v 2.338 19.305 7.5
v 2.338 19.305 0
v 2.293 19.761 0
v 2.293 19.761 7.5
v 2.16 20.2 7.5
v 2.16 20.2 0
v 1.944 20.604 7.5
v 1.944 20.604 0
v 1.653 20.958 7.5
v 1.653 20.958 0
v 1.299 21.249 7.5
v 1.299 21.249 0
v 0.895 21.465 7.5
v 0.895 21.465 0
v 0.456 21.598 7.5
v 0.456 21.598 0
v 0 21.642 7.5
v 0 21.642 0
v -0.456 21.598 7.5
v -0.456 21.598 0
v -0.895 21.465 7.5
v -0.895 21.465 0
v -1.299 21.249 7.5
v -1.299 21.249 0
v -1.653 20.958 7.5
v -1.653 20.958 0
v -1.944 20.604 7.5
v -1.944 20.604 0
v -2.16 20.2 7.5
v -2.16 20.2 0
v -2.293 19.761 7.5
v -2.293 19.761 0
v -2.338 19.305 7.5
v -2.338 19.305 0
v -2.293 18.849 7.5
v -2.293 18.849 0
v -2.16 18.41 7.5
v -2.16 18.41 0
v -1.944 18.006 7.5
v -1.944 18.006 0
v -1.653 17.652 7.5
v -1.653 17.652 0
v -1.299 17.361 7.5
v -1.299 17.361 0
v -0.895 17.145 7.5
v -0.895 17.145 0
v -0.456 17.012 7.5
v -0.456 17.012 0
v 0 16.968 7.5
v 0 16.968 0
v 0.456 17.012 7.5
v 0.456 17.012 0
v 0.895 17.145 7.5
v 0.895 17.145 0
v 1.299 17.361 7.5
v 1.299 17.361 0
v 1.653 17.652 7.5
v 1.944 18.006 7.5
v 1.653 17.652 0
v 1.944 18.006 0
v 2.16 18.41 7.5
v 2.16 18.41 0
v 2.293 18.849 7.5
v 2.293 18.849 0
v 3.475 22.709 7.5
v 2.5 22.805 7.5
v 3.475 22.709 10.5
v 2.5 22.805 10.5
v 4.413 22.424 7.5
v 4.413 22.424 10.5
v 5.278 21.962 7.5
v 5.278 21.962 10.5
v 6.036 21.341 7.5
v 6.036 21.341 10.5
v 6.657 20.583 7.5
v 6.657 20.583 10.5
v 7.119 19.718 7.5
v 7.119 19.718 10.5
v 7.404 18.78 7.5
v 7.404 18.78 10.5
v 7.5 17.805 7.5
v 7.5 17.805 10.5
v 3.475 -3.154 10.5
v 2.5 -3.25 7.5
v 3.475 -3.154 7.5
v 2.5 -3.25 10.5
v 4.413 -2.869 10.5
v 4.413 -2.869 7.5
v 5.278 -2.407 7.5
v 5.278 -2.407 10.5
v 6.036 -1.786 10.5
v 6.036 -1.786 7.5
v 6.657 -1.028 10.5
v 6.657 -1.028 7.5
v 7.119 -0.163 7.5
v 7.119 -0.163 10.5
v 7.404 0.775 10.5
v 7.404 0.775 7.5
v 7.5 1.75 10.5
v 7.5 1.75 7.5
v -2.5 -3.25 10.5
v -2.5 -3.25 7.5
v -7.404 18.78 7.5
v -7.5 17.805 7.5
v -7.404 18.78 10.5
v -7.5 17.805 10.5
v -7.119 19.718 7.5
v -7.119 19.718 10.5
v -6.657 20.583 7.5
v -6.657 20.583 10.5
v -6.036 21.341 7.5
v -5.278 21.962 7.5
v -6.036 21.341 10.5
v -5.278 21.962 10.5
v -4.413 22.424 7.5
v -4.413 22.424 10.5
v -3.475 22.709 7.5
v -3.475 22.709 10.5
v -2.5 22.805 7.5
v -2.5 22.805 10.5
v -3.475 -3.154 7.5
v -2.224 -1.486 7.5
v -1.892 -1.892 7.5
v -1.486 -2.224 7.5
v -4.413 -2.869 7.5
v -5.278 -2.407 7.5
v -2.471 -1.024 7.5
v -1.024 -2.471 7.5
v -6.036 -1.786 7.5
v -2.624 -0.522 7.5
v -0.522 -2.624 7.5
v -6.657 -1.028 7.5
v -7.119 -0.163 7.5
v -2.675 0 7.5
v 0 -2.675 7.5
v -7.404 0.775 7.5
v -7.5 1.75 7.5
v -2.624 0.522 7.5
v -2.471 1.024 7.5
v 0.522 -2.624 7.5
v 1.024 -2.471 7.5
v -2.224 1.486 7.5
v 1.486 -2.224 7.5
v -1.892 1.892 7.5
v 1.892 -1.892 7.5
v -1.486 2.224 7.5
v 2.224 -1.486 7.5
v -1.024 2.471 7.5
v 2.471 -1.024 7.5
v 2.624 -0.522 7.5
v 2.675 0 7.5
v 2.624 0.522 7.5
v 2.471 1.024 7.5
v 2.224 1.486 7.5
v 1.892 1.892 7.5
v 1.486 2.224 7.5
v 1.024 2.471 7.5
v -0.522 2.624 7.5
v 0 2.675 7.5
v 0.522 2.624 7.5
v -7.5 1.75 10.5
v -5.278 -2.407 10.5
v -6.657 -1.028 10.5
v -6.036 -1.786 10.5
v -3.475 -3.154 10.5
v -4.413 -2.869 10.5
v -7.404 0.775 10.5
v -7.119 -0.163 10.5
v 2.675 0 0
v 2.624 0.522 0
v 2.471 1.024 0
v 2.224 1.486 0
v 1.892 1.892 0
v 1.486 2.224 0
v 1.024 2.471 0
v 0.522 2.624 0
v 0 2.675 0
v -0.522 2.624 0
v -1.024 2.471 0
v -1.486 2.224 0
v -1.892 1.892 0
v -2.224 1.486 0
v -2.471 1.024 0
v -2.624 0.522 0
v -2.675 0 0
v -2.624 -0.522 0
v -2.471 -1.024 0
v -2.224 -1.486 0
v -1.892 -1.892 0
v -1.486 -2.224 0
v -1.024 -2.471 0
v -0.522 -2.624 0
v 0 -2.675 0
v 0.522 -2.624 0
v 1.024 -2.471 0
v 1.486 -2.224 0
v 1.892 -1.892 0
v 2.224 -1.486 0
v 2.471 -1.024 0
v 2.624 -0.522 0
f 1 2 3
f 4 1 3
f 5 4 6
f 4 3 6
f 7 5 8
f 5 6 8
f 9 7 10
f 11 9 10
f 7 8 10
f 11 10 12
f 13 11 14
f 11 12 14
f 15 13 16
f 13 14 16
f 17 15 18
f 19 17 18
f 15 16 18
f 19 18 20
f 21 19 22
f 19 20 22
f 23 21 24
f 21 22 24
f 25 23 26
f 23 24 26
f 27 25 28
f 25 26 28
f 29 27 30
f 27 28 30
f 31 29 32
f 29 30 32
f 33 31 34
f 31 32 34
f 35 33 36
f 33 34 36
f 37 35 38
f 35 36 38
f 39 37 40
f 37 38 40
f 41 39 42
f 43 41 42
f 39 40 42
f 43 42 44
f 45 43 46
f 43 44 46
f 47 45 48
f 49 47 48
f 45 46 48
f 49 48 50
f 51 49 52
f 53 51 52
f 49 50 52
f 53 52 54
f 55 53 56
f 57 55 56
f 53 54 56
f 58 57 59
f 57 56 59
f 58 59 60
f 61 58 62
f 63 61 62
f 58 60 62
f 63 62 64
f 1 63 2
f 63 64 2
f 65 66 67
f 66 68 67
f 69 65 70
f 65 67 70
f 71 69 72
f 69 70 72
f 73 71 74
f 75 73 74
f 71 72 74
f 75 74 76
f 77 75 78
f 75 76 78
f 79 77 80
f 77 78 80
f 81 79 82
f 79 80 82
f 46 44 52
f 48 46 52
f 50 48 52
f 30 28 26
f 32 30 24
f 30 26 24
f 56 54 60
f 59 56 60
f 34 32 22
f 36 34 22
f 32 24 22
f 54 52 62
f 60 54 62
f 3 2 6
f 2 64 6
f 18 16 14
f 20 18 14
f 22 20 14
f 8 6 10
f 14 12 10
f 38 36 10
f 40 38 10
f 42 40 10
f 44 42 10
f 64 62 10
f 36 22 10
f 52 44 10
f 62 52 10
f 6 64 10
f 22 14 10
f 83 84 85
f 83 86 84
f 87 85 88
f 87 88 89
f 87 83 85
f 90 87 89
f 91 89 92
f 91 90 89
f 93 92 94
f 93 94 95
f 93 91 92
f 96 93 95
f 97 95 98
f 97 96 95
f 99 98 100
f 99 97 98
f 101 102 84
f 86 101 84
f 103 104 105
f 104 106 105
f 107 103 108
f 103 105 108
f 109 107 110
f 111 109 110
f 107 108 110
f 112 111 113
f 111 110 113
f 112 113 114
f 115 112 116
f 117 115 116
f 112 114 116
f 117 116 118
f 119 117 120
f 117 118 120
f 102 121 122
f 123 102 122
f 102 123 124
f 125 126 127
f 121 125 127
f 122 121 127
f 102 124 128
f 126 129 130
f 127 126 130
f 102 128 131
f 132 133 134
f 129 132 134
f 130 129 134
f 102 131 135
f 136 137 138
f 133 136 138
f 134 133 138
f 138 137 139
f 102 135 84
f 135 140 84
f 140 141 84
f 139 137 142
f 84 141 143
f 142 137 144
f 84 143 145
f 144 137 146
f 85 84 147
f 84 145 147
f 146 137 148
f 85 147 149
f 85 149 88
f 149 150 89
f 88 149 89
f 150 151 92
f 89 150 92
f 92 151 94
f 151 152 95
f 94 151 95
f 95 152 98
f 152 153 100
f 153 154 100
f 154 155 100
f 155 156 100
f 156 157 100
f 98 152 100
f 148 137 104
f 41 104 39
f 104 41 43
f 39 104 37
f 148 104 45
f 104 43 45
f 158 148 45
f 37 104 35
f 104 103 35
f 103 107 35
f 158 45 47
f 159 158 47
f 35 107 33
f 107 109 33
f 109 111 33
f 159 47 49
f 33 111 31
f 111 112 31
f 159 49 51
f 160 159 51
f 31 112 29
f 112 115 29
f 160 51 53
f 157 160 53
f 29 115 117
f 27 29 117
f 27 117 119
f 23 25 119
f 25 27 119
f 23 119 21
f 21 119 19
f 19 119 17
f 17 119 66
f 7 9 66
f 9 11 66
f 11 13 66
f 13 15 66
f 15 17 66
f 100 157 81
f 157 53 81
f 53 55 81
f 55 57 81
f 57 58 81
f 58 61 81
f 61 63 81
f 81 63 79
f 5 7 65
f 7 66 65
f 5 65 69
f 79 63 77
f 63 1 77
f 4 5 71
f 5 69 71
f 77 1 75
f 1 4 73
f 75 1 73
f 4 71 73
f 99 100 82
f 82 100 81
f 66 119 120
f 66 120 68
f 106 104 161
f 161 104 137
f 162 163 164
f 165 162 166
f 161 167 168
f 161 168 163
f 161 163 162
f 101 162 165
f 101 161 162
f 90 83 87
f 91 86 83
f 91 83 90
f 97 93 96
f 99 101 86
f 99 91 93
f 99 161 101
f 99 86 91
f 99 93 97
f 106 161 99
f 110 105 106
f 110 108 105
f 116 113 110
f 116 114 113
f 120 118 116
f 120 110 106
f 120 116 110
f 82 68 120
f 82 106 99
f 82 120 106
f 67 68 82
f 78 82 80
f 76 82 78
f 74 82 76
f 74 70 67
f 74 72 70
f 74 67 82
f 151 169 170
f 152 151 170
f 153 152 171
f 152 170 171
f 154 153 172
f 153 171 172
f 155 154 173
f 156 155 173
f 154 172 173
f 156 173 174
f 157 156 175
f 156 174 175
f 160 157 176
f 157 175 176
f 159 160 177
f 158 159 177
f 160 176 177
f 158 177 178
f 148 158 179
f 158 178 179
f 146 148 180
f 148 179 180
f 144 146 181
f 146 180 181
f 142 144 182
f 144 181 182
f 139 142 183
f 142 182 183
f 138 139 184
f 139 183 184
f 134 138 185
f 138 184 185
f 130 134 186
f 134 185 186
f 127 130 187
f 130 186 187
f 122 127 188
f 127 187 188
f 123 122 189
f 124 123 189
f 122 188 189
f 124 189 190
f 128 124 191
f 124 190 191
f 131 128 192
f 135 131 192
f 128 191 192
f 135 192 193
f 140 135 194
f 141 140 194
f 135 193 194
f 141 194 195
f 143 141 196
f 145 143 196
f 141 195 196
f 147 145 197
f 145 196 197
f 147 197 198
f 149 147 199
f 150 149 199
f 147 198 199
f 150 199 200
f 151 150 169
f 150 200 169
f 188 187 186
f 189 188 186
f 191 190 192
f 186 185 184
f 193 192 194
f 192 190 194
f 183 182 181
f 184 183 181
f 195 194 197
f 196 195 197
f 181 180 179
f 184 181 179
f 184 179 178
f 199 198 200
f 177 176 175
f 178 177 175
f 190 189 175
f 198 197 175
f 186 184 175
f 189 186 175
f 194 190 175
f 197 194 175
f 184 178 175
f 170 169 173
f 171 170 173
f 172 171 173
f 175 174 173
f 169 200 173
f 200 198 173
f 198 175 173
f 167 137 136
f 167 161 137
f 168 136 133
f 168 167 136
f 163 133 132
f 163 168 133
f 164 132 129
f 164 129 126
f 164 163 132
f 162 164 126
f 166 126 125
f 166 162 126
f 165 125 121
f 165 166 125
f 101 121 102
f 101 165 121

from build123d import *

# Parameters (mm, degrees)
F0_R     = 2.675
F1_DEPTH = 7.5
F0_R_2   = 2.3375
F2_W     = 15
F2_H     = 7
F2_R     = 2.3375
F2_H_2   = 12.555
F2_H_3   = 6.5
F3_DEPTH = 3
F4_R     = 5


# Not quite as in the source:
# - a feature names something its author has since deleted; it is built from what else it names


with BuildPart() as f1:
    # F0 (on Top) → F1 (new body)
    with BuildSketch(Plane.XY):
        Circle(F0_R)
    extrude(amount=F1_DEPTH)



with BuildPart() as f1b:
    # F0 (on Top) → F1, piece 2 (new body)
    with BuildSketch(Plane.XY):
        with Locations((0, 19.305)):
            Circle(F0_R_2)
    extrude(amount=F1_DEPTH)


with BuildPart() as f1_1:
    add(f1.part)

    add(f1b.part)  # F3 merges F1b
    # F2 (on face) → F3 (join)
    with BuildSketch(Plane.XY.offset(7.5)):
        with Locations((0, 19.305)):
            Rectangle(F2_W, F2_H)
        with Locations((0, 19.305)):
            Circle(F2_R, mode=Mode.SUBTRACT)
        with Locations((0, 19.305)):
            Circle(F2_R)
        with Locations((0, 9.5275)):
            Rectangle(F2_W, F2_H_2)
        Rectangle(F2_W, F2_H_3)
    extrude(amount=F3_DEPTH)

    # F4
    f4_edges = [f1_1.edges().sort_by_distance(p)[0] for p in [
        (-7.5, -3.25, 9),
        (7.5, -3.25, 9),
        (7.5, 22.805, 9),
        (-7.5, 22.805, 9),
    ]]
    fillet(f4_edges, radius=F4_R)


solid = f1_1.part
